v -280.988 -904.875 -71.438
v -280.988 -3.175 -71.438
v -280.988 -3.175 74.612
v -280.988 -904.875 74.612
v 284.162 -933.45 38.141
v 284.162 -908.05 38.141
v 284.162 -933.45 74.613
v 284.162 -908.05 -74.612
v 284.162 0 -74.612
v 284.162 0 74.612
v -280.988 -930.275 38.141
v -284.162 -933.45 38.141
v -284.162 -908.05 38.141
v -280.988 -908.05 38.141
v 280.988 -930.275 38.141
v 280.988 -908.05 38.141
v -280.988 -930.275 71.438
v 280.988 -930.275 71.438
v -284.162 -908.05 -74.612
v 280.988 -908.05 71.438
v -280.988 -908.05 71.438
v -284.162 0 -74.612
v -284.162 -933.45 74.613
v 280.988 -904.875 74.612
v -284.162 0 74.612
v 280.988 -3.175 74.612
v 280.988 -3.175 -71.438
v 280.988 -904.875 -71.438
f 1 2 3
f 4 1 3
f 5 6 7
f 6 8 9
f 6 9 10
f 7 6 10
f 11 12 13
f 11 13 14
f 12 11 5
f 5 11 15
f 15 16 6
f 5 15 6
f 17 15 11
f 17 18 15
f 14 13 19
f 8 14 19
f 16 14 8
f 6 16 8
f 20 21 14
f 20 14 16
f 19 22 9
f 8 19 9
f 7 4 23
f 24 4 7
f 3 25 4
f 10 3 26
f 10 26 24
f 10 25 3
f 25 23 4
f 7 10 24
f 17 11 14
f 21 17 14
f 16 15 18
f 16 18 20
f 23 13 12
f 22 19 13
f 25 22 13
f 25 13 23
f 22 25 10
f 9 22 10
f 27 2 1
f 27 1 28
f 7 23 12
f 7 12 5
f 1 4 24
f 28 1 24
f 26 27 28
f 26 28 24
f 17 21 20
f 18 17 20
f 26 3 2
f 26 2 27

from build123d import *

# Parameters (mm, degrees)
F0_W     = 568.325
F0_H     = 149.225
F1_DEPTH = 908.05
F2_T     = -3.175
F3_W     = 568.325
F3_H     = 36.4719758213
F4_DEPTH = 25.4
F5_T     = -3.175


# Not quite as in the source:
# - a shell that OpenCascade refuses in one call is made with other operations: the cavity is built on its own and cut out


with BuildPart() as f1:
    # F0 (on Front) → F1 (new body)
    with BuildSketch(Plane.XZ):
        Rectangle(F0_W, F0_H)
    extrude(amount=F1_DEPTH)

    # F2
    f2_openings = [f1.faces().sort_by_distance(p)[0] for p in [
        (0, -454.025, 74.6125),
    ]]
    offset(amount=F2_T, openings=f2_openings)

    # F3 (on face) → F4 (join)
    with BuildSketch(Plane.XZ.offset(908.05)):
        with Locations((0, 56.3765120894)):
            Rectangle(F3_W, F3_H)
    extrude(amount=F4_DEPTH)

    # F5: a shell. OpenCascade refuses it in one call, so the cavity is built on its own and cut out:
    # the body offset inwards by the wall thickness, plus a prism from it out through each open face.
    f5_core = offset(f1.part, amount=F5_T, kind=Kind.INTERSECTION, mode=Mode.PRIVATE)
    f5_exits = [f5_core.faces().sort_by_distance(p)[0] for p in [
        (0, -919.1625, 41.315524),
    ]]
    add(f5_core, mode=Mode.SUBTRACT)
    extrude(f5_exits, amount=-F5_T, mode=Mode.SUBTRACT)


solid = f1.part
